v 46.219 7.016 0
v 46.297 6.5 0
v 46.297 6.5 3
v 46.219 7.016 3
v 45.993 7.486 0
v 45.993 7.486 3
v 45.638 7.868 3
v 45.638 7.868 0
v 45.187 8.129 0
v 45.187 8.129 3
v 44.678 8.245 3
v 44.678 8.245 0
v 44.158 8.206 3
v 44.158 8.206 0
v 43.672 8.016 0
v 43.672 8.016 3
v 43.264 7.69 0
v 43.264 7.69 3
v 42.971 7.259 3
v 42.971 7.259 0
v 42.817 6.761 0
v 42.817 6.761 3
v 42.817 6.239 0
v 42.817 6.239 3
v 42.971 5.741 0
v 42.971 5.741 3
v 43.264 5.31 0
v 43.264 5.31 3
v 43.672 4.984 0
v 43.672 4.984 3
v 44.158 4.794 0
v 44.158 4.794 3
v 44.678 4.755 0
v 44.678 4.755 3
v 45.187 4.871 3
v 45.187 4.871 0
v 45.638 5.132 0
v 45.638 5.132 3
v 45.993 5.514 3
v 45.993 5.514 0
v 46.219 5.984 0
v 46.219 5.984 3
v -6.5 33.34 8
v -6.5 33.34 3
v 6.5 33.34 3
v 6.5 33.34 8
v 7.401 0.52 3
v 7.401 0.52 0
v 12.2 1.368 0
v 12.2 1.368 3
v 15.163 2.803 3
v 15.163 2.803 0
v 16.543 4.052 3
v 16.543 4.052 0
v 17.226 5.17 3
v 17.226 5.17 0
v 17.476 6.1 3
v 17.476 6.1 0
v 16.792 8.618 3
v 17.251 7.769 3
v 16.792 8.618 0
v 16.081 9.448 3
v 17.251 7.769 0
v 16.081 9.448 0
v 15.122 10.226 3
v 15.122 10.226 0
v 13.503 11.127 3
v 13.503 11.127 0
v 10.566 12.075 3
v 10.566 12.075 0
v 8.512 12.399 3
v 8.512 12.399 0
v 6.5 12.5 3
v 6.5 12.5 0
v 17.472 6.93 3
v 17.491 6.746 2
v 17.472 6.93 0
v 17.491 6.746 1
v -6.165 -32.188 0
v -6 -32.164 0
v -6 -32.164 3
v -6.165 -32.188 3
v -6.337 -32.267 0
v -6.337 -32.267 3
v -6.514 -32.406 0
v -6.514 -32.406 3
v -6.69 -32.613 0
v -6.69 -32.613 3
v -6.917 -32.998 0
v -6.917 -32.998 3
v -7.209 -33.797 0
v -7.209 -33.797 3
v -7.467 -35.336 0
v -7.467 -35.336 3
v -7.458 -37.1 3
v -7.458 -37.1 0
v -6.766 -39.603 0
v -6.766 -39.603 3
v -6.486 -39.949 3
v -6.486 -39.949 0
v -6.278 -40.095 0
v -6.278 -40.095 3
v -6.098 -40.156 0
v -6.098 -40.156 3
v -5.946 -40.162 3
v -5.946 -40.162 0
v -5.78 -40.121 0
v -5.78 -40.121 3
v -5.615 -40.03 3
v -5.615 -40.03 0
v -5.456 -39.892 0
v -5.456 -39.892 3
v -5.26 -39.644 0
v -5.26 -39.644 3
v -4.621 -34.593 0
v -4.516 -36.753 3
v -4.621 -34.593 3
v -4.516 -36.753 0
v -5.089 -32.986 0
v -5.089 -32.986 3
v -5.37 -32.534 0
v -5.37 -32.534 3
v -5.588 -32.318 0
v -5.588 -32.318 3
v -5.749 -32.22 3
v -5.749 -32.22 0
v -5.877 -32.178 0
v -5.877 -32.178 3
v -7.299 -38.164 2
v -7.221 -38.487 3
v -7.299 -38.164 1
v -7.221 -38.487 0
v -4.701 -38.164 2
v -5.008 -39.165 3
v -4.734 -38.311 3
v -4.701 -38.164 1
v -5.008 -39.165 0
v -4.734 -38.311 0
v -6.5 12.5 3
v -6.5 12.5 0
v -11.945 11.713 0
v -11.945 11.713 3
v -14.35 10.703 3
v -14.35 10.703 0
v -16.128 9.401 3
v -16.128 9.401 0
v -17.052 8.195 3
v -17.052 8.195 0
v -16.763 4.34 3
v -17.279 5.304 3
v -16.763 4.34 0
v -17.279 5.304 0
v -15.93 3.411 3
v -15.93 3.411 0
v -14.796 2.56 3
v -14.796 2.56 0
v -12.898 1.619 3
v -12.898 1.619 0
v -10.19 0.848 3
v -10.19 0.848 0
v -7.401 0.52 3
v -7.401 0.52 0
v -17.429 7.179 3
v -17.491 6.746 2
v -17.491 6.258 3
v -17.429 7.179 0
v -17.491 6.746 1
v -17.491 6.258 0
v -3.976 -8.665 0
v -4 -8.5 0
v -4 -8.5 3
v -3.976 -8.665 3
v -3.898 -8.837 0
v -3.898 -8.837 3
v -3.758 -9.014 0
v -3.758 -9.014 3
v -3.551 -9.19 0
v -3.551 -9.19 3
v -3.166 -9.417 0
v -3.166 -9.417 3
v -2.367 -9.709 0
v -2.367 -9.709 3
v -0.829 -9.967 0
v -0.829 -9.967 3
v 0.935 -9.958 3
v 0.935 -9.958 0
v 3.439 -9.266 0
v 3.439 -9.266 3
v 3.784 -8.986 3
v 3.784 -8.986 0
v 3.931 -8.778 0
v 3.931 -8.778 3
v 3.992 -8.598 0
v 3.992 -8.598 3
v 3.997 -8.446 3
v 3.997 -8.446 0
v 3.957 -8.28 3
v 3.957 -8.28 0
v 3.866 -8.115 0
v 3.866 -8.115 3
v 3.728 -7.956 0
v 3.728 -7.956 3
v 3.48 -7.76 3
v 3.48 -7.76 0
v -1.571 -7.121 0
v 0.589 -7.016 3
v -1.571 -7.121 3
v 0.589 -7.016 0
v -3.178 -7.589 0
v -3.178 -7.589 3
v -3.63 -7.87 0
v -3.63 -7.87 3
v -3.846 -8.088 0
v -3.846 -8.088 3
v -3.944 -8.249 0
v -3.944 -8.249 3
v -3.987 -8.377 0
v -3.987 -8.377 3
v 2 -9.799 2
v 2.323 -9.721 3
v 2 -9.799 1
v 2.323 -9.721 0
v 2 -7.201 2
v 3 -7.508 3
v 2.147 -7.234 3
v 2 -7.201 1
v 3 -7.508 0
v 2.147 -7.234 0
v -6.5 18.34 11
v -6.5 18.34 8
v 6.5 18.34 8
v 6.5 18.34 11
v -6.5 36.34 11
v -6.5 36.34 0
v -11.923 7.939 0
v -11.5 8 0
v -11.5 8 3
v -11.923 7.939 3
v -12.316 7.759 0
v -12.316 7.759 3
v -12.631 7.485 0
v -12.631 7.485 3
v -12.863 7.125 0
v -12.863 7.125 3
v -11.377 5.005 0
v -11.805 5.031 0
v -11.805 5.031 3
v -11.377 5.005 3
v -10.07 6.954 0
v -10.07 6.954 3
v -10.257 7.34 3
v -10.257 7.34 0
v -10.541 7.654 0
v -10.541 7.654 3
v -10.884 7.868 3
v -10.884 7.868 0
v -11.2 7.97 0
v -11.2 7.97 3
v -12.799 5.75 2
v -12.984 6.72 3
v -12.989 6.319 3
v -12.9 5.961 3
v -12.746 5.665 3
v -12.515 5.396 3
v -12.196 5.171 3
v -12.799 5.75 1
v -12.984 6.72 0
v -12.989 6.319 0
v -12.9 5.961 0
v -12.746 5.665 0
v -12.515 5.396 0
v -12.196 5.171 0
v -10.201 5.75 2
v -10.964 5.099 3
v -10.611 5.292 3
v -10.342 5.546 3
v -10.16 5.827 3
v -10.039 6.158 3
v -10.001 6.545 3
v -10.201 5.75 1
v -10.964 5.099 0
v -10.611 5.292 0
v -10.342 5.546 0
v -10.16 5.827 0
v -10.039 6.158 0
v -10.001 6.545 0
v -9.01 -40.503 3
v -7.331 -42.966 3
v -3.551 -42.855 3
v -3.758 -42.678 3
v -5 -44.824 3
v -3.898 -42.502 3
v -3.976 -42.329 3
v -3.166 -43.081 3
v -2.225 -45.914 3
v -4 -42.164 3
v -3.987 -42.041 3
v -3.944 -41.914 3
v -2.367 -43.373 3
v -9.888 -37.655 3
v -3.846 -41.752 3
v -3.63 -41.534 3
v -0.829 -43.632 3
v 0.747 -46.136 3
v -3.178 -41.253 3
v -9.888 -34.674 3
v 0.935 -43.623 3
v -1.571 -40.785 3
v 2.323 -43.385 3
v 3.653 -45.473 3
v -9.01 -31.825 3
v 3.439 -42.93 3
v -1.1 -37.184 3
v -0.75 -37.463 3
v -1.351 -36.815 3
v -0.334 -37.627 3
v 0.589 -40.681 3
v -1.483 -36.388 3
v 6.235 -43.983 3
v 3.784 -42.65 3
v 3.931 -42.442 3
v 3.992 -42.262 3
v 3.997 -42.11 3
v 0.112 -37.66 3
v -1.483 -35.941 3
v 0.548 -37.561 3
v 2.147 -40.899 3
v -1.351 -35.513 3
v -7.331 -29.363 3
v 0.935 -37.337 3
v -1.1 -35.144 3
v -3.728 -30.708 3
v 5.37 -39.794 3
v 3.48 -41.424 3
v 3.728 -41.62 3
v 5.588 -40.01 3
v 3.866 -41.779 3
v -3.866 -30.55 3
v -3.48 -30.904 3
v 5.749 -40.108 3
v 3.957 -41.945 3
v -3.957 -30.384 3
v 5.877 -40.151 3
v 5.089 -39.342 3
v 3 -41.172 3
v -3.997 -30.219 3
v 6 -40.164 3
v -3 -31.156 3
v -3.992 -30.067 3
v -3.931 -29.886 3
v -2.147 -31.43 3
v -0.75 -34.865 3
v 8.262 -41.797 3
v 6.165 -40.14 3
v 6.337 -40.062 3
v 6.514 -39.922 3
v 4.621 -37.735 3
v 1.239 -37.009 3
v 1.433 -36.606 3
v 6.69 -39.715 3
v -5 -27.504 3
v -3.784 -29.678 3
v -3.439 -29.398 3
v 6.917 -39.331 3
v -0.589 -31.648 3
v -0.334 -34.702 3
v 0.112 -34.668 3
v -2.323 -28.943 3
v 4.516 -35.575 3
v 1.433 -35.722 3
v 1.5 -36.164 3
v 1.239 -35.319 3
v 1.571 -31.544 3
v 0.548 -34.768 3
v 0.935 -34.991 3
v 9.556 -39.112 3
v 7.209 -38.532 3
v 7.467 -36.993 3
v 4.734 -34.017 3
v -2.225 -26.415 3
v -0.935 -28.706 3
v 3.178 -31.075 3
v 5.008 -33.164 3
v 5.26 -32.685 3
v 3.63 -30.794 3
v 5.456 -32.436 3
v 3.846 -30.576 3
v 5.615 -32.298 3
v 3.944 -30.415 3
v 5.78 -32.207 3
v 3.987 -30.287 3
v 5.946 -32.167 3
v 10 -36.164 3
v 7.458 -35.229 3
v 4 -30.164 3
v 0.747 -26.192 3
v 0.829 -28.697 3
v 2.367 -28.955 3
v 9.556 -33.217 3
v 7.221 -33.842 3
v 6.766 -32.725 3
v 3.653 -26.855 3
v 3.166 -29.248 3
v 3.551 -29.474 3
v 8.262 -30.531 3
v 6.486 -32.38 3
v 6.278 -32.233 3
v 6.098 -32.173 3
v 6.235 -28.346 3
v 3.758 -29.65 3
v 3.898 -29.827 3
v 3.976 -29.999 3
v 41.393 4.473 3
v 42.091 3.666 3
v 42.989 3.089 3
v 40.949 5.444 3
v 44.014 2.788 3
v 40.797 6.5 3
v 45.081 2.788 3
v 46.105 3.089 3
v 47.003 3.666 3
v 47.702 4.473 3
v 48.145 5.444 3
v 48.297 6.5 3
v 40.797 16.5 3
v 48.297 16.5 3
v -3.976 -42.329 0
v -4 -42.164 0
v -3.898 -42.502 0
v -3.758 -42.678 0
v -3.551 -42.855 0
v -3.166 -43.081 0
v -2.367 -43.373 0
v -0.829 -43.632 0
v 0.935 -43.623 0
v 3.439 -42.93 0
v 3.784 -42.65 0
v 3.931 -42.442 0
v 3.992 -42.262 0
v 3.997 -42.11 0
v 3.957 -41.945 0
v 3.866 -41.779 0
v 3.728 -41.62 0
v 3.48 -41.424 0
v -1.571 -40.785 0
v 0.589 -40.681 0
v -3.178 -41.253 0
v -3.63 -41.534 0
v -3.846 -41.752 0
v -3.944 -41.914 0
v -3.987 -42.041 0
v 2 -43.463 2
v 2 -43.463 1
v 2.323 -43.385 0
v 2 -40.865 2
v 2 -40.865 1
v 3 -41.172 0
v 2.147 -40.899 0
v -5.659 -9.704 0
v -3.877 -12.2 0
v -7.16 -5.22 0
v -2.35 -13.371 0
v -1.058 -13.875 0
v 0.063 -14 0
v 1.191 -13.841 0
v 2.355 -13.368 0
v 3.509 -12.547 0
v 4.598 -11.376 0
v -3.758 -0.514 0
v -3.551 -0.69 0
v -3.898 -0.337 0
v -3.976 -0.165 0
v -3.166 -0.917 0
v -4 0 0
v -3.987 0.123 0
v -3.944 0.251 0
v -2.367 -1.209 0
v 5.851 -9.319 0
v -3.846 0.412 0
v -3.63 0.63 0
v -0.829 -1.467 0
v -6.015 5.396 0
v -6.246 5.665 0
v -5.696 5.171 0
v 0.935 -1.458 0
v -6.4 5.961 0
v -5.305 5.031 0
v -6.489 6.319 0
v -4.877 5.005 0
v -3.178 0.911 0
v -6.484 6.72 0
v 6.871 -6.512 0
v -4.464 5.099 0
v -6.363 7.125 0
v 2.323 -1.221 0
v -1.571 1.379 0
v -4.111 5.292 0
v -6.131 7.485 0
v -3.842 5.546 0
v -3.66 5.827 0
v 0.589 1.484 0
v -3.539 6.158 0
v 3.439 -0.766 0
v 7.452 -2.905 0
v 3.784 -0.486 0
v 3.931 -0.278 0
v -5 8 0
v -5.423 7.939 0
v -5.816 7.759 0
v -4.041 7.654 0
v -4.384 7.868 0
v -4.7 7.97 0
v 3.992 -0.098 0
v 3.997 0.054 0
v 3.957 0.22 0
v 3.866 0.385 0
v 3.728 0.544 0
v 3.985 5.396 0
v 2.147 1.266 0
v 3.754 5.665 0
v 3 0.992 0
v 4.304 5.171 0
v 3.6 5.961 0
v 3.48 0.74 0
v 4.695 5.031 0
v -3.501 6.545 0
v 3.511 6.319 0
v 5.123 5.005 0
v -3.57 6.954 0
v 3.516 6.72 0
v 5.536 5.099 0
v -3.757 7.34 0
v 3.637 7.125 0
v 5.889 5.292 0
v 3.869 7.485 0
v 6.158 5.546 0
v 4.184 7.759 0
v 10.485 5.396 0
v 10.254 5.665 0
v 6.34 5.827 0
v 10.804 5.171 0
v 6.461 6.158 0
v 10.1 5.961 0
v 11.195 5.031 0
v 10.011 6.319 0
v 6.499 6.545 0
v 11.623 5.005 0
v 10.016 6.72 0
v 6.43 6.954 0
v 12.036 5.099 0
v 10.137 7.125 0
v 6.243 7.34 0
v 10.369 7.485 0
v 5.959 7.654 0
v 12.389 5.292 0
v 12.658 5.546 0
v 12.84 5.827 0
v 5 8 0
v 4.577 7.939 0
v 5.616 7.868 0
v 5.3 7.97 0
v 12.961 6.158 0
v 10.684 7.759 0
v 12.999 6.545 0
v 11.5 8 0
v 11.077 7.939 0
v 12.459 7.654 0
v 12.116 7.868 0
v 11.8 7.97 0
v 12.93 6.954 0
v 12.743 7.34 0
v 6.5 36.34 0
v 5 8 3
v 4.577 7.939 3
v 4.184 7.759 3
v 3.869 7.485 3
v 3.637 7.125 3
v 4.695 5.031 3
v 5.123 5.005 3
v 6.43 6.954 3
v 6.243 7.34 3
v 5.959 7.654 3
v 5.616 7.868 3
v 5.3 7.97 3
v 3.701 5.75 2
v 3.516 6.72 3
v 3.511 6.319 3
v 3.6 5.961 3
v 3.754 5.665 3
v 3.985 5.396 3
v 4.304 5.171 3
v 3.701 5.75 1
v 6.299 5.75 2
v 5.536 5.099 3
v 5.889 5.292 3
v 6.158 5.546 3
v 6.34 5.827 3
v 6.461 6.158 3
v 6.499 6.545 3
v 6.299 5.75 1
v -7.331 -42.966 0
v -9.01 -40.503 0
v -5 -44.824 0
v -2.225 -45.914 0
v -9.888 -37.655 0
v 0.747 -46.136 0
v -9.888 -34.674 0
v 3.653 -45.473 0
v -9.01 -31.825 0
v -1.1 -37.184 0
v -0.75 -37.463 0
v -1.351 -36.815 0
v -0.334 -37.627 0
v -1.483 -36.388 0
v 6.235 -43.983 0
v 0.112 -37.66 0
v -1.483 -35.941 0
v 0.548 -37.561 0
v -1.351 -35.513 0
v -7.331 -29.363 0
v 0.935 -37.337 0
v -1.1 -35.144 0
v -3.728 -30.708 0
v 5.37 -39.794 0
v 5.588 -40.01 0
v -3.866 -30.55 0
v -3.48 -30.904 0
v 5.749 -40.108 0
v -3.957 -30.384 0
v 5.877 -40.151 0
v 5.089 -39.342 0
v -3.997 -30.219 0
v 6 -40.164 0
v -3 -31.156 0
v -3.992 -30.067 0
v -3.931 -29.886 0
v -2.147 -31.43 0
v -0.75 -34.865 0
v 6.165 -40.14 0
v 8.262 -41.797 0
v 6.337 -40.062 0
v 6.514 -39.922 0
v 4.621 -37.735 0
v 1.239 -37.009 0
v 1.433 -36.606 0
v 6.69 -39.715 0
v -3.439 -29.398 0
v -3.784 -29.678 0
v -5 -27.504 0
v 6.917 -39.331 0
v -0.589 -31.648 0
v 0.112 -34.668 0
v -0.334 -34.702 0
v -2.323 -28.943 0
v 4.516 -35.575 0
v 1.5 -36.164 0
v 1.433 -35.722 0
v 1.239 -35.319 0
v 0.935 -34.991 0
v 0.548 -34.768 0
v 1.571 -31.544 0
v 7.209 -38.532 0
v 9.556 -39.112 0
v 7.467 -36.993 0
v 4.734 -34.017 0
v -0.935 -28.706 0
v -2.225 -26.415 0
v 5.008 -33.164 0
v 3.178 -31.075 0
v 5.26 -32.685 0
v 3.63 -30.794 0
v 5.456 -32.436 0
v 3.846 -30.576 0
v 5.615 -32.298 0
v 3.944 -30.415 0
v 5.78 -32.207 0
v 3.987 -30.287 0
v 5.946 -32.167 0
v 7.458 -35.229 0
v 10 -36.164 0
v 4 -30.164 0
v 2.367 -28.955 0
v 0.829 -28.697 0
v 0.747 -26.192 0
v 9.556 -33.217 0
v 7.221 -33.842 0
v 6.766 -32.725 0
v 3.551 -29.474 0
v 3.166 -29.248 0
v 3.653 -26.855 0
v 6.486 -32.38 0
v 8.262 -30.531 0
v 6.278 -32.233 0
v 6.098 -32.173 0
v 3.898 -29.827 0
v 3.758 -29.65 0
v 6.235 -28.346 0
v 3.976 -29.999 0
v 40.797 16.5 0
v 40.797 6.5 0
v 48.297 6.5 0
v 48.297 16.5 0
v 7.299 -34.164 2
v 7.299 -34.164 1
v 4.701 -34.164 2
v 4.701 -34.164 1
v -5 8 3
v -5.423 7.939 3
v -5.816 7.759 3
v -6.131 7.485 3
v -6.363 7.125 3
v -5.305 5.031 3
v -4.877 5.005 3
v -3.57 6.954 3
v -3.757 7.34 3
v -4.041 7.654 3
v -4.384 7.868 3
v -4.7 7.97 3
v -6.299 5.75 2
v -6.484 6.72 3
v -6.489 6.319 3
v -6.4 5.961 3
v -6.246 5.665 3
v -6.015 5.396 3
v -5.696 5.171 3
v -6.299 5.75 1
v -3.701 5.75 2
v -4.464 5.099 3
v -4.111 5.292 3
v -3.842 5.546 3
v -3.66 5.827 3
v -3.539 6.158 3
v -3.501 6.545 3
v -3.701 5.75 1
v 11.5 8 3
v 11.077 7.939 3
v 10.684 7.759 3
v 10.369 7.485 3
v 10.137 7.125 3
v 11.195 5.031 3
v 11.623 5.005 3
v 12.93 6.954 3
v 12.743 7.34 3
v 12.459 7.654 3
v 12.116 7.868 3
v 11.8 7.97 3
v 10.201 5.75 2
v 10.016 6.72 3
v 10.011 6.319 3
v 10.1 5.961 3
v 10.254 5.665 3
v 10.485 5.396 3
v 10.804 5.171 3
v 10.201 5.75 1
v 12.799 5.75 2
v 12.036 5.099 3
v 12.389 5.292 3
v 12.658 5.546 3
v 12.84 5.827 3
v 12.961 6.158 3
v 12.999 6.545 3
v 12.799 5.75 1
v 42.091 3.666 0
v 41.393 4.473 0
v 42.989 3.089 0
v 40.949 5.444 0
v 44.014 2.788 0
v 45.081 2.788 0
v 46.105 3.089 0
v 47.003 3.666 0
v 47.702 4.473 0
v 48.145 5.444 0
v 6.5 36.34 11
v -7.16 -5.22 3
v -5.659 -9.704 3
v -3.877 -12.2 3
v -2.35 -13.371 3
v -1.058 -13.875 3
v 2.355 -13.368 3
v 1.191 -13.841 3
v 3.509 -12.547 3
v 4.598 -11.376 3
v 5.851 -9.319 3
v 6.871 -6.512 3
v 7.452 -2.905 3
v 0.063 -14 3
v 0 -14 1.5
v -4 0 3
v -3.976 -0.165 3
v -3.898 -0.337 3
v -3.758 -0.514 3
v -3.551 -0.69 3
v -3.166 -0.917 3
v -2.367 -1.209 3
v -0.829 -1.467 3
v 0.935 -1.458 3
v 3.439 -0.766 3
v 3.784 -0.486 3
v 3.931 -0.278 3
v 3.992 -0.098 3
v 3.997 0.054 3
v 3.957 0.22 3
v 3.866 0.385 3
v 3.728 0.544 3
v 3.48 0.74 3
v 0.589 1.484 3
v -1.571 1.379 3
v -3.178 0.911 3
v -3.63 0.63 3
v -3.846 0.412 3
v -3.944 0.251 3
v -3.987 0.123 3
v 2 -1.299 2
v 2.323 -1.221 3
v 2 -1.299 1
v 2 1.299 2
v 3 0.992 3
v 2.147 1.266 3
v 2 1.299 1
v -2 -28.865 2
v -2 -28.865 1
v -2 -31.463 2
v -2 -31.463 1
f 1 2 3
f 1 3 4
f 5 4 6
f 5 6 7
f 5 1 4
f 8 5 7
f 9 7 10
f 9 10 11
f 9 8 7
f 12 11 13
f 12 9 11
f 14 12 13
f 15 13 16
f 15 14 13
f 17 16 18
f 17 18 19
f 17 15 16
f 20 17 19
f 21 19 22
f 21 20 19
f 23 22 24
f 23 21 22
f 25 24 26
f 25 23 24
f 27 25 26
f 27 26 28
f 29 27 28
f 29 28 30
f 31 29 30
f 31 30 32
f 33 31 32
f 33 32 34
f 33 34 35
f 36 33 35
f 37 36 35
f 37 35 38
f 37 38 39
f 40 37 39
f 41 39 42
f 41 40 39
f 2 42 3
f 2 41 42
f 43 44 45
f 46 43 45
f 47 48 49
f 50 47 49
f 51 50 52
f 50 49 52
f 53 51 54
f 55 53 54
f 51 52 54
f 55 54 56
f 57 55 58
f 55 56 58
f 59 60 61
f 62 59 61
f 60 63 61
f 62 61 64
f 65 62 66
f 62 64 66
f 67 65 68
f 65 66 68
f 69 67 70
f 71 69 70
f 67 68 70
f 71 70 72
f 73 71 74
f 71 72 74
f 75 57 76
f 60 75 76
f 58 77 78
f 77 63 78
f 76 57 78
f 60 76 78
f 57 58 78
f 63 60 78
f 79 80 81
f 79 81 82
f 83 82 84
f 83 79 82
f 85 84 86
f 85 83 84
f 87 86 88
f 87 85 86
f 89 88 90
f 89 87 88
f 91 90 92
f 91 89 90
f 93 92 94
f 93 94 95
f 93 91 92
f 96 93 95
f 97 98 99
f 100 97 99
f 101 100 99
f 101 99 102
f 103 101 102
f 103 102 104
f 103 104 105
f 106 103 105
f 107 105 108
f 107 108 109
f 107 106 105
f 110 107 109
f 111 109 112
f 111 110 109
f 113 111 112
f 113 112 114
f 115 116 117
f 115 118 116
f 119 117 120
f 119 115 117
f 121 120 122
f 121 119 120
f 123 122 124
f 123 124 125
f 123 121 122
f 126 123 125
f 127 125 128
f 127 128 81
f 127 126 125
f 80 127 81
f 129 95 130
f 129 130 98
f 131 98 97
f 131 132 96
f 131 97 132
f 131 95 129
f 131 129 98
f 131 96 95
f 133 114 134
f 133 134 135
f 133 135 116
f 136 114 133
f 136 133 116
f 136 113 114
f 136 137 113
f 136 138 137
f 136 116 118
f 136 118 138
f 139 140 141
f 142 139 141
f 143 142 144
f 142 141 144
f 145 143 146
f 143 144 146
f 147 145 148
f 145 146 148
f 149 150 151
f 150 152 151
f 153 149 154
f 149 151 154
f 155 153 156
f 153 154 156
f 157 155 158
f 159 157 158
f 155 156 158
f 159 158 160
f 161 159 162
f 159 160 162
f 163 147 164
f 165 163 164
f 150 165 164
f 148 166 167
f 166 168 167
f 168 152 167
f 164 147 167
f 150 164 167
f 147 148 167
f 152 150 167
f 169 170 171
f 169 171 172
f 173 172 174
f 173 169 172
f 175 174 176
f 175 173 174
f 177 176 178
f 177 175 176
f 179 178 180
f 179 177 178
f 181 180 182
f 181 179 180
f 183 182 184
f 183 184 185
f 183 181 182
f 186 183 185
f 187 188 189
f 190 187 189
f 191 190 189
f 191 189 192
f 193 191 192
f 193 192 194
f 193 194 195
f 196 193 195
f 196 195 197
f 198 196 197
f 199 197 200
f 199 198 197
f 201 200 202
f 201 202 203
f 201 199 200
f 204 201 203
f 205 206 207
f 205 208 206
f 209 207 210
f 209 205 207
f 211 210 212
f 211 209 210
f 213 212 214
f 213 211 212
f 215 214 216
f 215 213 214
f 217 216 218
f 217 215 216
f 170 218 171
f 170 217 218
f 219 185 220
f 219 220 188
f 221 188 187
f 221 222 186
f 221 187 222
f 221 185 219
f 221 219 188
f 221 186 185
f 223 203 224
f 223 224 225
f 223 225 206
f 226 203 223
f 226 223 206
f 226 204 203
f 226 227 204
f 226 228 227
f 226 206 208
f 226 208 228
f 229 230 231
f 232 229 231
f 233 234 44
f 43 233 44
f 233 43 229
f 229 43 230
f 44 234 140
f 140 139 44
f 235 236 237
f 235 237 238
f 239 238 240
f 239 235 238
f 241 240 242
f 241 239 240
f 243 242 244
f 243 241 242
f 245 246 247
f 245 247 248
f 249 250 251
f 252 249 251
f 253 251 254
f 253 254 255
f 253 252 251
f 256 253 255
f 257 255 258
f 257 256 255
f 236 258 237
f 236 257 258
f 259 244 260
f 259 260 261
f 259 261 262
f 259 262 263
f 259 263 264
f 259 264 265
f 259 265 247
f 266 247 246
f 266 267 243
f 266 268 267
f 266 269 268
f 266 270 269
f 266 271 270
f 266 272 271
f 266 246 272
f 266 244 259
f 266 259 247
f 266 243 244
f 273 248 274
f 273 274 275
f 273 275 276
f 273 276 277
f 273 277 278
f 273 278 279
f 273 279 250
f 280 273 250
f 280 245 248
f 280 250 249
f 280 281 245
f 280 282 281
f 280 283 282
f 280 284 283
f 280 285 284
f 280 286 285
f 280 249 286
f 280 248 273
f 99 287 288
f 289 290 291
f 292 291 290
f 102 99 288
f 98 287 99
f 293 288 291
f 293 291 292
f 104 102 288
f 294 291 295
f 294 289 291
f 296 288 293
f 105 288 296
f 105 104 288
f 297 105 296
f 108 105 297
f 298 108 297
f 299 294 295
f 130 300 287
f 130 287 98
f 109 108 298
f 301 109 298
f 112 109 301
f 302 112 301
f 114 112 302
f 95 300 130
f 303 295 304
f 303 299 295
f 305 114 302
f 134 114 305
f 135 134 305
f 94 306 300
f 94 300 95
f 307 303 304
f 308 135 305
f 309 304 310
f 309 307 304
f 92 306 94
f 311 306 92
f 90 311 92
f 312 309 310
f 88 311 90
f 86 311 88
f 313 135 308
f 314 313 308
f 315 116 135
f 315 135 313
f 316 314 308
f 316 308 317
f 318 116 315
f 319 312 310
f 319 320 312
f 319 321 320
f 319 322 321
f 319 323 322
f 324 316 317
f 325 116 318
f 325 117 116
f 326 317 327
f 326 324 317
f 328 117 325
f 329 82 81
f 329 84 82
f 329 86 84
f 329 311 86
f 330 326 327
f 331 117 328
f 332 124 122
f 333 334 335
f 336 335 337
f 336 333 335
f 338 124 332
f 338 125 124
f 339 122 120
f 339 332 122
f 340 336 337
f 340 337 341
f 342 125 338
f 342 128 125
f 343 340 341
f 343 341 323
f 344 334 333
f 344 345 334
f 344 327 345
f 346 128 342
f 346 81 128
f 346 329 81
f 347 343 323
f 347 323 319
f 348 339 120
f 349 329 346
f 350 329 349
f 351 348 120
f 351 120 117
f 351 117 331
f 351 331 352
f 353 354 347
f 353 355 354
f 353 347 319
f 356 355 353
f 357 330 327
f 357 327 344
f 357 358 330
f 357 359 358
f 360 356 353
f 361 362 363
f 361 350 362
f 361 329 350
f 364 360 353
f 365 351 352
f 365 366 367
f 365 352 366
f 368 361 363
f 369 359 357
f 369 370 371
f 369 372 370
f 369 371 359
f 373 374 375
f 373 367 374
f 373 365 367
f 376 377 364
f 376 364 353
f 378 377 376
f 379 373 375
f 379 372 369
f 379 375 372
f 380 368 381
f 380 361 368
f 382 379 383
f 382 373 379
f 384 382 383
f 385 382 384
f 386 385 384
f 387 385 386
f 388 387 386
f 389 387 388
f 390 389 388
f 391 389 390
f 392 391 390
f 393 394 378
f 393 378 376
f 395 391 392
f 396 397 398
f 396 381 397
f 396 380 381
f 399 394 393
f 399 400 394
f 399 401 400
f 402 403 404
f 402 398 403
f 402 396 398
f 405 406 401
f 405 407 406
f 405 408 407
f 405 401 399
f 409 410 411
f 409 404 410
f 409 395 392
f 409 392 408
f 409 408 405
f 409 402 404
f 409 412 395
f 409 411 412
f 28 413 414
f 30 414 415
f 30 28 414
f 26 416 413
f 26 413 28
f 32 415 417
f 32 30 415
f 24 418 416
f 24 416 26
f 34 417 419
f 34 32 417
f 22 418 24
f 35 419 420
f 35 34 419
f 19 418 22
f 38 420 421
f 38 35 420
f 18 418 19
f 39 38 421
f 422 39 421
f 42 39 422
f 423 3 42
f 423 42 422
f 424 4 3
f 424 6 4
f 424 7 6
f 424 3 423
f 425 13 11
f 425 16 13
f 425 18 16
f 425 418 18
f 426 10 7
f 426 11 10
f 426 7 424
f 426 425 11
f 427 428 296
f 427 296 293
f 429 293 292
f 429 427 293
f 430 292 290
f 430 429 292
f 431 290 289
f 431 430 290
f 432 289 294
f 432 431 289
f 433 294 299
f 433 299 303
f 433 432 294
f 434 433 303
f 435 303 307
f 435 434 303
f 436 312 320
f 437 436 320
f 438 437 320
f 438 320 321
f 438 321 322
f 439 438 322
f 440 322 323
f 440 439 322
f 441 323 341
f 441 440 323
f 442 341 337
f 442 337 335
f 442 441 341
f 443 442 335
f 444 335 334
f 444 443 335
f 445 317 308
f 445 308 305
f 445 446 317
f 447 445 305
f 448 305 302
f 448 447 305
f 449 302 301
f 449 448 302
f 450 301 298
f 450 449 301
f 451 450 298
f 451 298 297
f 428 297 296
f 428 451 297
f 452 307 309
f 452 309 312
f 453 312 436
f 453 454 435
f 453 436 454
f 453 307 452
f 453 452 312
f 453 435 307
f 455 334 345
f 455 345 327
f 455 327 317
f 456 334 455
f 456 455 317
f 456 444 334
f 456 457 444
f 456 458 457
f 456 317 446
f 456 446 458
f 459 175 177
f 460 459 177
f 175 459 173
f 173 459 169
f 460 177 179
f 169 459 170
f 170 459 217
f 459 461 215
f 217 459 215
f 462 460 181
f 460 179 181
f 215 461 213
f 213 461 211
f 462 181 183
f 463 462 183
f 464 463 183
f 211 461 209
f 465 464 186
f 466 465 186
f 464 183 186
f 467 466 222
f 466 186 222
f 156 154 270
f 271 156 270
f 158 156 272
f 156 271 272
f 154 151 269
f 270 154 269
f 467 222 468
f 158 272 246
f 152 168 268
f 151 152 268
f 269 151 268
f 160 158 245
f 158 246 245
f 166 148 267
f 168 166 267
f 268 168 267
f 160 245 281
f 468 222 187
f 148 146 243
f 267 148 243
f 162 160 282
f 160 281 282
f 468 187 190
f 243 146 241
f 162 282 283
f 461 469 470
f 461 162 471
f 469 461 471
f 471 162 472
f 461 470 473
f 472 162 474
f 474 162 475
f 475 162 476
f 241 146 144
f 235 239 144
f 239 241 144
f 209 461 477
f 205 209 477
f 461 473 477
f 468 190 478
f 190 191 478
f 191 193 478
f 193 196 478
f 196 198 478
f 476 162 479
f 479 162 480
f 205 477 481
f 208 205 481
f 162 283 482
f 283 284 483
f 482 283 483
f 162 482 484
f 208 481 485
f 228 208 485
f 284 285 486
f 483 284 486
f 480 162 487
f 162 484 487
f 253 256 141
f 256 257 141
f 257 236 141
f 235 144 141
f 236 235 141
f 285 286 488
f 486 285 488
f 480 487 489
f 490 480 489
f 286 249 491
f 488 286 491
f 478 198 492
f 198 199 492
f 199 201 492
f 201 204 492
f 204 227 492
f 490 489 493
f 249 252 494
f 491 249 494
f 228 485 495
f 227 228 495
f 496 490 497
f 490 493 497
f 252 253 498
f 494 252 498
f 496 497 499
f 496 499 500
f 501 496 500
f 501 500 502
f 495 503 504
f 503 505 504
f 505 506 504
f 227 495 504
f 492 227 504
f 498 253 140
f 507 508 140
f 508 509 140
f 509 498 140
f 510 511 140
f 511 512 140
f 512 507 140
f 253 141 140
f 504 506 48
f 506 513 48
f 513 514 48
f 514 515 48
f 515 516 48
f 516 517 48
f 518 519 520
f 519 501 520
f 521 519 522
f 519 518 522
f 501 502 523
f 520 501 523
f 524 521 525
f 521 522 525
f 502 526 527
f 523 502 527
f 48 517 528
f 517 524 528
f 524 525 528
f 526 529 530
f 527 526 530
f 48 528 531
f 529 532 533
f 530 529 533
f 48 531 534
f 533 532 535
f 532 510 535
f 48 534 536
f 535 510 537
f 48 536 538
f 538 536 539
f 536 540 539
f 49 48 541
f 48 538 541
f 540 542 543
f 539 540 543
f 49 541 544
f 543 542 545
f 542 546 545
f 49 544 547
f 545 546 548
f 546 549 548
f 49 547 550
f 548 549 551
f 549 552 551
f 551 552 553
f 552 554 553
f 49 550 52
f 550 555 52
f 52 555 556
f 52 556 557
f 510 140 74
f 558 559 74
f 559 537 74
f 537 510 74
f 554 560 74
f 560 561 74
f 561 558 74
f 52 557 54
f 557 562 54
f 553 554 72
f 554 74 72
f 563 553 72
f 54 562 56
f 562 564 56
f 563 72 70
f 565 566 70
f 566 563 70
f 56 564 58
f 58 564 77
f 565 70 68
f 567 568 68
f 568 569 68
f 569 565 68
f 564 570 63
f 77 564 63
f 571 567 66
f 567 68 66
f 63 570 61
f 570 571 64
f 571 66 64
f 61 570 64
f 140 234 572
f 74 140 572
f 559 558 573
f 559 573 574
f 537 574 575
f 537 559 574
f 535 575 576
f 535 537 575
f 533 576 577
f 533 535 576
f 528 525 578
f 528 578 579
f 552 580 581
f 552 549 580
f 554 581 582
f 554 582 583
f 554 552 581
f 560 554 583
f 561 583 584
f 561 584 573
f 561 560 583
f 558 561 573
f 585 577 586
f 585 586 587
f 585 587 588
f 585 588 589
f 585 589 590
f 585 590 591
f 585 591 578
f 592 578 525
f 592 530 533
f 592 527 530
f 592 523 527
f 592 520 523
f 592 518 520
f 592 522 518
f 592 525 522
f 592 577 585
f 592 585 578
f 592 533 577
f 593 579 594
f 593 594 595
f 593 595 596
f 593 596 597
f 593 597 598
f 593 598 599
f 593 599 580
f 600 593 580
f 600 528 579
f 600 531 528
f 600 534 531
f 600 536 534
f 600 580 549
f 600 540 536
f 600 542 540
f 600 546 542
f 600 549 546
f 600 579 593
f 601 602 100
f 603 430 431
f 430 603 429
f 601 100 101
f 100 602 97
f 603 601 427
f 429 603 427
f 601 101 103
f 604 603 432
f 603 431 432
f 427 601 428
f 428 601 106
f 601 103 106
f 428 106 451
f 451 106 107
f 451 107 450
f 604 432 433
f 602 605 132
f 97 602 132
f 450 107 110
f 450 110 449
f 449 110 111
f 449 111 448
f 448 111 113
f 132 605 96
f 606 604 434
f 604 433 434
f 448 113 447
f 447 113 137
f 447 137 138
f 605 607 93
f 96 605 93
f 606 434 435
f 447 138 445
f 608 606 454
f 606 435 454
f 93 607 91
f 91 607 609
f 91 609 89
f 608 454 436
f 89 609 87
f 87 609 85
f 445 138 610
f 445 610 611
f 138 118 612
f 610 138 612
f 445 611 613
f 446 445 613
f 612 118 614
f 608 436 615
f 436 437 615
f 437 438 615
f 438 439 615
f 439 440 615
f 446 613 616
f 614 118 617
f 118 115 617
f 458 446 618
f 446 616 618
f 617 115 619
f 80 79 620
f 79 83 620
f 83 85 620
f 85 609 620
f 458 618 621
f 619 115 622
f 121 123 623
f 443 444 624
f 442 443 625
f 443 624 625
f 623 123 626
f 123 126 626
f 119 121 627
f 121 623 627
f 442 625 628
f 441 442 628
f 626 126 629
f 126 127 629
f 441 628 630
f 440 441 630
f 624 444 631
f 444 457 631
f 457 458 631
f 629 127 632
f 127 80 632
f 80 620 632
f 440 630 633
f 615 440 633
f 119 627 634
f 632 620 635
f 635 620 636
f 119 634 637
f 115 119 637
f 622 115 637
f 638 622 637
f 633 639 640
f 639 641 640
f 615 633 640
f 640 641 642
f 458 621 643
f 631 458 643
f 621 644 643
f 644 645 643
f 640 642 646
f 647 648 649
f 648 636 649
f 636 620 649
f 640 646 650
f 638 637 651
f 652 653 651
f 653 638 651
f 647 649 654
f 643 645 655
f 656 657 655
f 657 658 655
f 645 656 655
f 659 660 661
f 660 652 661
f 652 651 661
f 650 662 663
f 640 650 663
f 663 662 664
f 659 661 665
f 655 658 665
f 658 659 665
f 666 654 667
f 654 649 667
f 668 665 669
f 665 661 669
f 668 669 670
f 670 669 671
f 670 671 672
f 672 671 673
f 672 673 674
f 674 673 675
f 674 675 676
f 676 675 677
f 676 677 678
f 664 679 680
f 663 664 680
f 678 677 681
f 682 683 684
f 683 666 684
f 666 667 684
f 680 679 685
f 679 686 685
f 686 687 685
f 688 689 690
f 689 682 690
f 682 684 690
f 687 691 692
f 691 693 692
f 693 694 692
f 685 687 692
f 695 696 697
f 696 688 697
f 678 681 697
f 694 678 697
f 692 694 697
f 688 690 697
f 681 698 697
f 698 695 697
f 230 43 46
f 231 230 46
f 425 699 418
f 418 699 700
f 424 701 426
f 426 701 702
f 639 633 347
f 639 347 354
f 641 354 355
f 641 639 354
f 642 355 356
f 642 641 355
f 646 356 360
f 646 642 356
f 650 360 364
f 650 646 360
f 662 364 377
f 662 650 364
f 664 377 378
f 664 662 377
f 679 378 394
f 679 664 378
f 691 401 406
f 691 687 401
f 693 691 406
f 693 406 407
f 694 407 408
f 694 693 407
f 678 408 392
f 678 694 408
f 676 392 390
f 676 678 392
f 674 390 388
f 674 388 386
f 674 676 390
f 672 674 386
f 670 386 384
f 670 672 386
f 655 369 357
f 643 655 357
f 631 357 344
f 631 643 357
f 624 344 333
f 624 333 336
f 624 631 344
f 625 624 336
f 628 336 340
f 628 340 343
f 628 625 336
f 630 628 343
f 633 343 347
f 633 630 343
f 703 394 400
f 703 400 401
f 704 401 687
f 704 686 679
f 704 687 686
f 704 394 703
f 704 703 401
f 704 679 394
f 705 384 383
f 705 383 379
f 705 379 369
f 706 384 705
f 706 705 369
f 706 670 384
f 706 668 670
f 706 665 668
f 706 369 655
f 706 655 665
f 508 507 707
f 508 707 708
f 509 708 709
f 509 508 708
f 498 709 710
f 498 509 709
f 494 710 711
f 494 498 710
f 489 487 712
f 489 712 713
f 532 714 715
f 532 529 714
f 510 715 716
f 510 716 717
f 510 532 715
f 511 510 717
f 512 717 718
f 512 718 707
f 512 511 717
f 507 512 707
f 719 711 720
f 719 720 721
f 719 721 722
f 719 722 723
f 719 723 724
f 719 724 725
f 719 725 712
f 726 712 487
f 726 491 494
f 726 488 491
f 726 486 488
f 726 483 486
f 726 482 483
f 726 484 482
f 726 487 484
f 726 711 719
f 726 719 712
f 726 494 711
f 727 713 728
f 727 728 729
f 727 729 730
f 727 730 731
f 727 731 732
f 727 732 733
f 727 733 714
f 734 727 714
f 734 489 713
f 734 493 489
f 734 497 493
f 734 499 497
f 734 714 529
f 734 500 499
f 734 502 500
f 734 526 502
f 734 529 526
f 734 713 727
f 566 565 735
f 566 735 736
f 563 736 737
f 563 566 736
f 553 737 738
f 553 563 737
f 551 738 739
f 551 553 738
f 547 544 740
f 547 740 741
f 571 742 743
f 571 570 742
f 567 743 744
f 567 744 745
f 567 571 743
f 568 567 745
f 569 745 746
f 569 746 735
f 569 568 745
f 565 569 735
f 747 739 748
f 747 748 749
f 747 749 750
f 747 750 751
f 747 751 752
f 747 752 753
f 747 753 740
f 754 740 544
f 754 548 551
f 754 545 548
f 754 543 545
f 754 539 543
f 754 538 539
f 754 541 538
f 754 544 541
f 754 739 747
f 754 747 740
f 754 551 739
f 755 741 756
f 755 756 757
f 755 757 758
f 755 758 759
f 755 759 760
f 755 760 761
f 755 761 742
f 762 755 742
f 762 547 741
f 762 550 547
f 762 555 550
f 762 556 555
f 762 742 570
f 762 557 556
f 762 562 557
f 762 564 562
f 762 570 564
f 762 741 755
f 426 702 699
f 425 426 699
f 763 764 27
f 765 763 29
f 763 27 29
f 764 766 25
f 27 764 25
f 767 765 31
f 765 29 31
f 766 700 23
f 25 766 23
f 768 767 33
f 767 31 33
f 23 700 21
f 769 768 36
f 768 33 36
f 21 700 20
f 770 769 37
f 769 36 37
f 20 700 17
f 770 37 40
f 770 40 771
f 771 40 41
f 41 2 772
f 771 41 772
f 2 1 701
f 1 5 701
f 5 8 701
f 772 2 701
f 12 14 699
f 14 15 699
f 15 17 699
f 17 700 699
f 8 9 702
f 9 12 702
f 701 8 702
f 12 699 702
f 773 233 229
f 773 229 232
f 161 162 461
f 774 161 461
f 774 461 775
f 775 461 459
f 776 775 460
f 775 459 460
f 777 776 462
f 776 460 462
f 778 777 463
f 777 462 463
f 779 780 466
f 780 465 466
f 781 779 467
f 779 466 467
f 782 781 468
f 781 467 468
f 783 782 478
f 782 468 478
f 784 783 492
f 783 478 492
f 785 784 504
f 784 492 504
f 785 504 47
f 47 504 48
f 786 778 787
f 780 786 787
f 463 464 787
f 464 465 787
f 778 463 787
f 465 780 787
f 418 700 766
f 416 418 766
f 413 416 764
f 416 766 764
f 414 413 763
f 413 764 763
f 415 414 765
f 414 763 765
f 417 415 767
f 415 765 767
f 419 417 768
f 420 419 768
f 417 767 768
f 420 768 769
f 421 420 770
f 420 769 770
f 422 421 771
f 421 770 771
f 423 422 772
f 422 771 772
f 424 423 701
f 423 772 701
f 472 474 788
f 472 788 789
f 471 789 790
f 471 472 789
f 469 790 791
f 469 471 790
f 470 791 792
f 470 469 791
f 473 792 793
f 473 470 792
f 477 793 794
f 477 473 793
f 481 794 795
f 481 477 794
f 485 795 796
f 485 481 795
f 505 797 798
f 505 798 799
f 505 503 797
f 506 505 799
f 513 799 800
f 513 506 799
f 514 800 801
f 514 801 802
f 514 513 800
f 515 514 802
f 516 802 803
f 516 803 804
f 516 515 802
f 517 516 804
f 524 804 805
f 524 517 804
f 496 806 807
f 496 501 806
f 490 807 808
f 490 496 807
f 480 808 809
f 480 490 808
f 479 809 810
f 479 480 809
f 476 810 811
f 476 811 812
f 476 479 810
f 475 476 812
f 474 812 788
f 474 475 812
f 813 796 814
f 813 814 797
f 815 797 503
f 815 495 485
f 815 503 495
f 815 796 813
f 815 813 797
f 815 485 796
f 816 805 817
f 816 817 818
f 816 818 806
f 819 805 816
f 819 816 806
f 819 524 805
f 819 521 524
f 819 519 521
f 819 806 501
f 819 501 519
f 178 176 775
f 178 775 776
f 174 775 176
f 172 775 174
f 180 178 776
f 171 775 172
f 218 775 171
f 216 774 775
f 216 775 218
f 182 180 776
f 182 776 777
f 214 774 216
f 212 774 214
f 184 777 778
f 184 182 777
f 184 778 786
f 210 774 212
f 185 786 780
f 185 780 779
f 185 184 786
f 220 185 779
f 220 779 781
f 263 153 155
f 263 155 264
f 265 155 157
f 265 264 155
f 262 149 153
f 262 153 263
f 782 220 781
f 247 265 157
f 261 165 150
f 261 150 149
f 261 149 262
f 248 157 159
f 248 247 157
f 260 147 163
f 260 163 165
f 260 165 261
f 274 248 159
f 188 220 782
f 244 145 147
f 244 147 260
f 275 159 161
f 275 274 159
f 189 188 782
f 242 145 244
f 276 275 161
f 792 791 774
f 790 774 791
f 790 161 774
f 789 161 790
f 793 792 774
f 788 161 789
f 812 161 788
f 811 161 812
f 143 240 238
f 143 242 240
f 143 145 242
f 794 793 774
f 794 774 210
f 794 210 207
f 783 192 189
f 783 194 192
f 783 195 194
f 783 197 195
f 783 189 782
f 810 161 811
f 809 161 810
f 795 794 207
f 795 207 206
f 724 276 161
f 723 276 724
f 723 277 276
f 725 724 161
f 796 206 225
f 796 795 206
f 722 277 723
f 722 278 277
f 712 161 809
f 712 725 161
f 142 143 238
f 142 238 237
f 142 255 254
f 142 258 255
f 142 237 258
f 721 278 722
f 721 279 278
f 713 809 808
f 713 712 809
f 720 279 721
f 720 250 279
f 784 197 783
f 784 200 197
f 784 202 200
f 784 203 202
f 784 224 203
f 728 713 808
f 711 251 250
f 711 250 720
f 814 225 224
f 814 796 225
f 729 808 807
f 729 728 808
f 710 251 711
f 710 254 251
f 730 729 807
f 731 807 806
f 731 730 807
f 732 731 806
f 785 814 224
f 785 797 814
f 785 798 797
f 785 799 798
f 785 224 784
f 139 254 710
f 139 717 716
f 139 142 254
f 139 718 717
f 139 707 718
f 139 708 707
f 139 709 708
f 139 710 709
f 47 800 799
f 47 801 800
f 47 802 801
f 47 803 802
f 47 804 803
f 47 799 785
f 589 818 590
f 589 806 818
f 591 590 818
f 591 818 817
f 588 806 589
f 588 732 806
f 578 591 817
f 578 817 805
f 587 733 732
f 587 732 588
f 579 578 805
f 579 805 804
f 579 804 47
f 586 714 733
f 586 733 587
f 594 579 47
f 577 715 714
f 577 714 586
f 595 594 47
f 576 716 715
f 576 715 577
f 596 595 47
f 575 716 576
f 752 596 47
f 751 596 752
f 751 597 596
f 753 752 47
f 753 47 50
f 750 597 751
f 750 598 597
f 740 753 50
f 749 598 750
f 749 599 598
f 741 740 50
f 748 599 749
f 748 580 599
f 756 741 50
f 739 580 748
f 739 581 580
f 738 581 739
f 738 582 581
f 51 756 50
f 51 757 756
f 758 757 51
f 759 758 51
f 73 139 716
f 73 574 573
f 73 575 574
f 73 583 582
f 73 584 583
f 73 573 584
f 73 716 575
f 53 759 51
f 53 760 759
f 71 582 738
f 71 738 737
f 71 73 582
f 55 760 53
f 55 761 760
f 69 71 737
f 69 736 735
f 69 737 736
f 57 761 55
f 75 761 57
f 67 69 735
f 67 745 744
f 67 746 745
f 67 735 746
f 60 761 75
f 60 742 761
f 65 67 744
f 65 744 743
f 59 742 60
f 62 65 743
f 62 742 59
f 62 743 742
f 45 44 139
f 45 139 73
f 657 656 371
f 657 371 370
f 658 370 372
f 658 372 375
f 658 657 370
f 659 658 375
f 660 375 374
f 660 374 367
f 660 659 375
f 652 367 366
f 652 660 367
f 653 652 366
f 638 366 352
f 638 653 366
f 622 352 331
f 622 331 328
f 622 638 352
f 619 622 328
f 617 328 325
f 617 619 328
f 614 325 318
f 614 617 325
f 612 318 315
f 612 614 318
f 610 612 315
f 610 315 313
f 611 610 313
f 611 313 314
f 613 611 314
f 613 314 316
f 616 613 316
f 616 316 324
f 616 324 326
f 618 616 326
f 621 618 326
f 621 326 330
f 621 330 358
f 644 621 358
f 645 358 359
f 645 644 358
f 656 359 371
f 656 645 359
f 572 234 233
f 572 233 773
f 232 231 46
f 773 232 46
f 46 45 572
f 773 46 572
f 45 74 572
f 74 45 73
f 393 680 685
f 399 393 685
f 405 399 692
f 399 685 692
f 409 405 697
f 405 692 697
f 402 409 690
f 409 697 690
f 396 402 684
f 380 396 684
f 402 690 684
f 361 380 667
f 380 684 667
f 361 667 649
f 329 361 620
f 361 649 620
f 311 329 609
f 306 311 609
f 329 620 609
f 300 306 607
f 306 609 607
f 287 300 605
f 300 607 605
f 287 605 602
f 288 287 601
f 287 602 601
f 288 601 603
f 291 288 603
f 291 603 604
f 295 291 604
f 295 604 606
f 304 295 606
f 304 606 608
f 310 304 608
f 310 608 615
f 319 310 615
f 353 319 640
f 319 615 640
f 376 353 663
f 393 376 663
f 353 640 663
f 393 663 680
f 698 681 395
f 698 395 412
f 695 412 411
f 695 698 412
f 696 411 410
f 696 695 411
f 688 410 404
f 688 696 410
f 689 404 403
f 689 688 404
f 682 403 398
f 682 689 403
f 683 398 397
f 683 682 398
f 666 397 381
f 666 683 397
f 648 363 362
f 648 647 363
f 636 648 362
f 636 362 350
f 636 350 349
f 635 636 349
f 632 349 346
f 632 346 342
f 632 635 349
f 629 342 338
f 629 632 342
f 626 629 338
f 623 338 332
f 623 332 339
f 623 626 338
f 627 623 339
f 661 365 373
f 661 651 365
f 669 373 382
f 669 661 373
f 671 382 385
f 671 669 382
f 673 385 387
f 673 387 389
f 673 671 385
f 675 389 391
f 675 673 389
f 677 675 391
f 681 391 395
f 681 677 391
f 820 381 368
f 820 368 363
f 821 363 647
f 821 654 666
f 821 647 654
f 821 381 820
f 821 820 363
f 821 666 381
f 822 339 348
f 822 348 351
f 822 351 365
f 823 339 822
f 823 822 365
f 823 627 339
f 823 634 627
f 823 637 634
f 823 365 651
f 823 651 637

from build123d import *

# Parameters (mm, degrees)
F0_W     = 13
F0_H     = 15
F0_H_2   = 3
F1_DEPTH = 3
F2_DEPTH = 11
F3_START = 8
F3_DEPTH = 3
F0_R     = 10
F0_R_2   = 1.5
F4_DEPTH = 3
F0_R_3   = 1.75
F5_DEPTH = 3


with BuildPart() as f1:
    # F0 (on Top) → F1 (new body)
    with BuildSketch(Plane.XY):
        with BuildLine():
            add(Edge.make_bspline(
                [(6.5, 12.5), (2.9023563725, 12.5), (0, 11.3404289134)],
                knots=[1.5707963268, 1.5707963268, 1.5707963268, 2.2029815755, 2.2029815755, 2.2029815755], degree=2, weights=[1, 0.9504572984, 1]))
            add(Edge.make_bspline(
                [(0, 11.3404289134), (-2.9023563725, 12.5), (-6.5, 12.5)],
                knots=[0.9386110781, 0.9386110781, 0.9386110781, 1.5707963268, 1.5707963268, 1.5707963268], degree=2, weights=[1, 0.9504572984, 1]))
            add(Edge.make_bspline(
                [(-6.5, 12.5), (-17.0577988838, 12.5), (-17.4907472501, 6.7460446753), (-17.9236956164, 0.9920893505), (-7.401404946, 0.5201793274)],
                knots=[1.5707963268, 1.5707963268, 1.5707963268, 3.1005737059, 3.1005737059, 4.630351085, 4.630351085, 4.630351085], degree=2, weights=[1, 0.7214594396, 1, 0.7214594396, 1]))
            add(Edge.make_bspline(
                [(-7.401404946, 0.5201793274), (-8.8281626867, -14), (0, -14), (8.8281626867, -14), (7.401404946, 0.5201793274)],
                knots=[4.5500626947, 4.5500626947, 4.5500626947, 6.2831853072, 6.2831853072, 8.0163079197, 8.0163079197, 8.0163079197], degree=2, weights=[1, 0.6474510228, 1, 0.6474510228, 1]))
            add(Edge.make_bspline(
                [(7.401404946, 0.5201793274), (17.9236956164, 0.9920893505), (17.4907472501, 6.7460446753), (17.0577988838, 12.5), (6.5, 12.5)],
                knots=[4.7944268757, 4.7944268757, 4.7944268757, 6.3242042549, 6.3242042549, 7.853981634, 7.853981634, 7.853981634], degree=2, weights=[1, 0.7214594396, 1, 0.7214594396, 1]))
        make_face()
        with BuildLine():
            add(Edge.make_bspline(
                [(-4, -8.5), (-4, -11.0980762114), (2, -9.7990381057), (8, -8.5), (2, -7.2009618943), (-4, -5.9019237886), (-4, -8.5)],
                knots=[0, 0, 0, 2.0943951024, 2.0943951024, 4.1887902048, 4.1887902048, 6.2831853072, 6.2831853072, 6.2831853072], degree=2, weights=[1, 0.5, 1, 0.5, 1, 0.5, 1]))
        make_face(mode=Mode.SUBTRACT)
        with BuildLine():
            add(Edge.make_bspline(
                [(-11.5, 8), (-14.0980762114, 8), (-12.7990381057, 5.75), (-11.5, 3.5), (-10.2009618943, 5.75), (-8.9019237886, 8), (-11.5, 8)],
                knots=[0, 0, 0, 2.0943951024, 2.0943951024, 4.1887902048, 4.1887902048, 6.2831853072, 6.2831853072, 6.2831853072], degree=2, weights=[1, 0.5, 1, 0.5, 1, 0.5, 1]))
        make_face(mode=Mode.SUBTRACT)
        with BuildLine():
            add(Edge.make_bspline(
                [(-5, 8), (-7.5980762114, 8), (-6.2990381057, 5.75), (-5, 3.5), (-3.7009618943, 5.75), (-2.4019237886, 8), (-5, 8)],
                knots=[0, 0, 0, 2.0943951024, 2.0943951024, 4.1887902048, 4.1887902048, 6.2831853072, 6.2831853072, 6.2831853072], degree=2, weights=[1, 0.5, 1, 0.5, 1, 0.5, 1]))
        make_face(mode=Mode.SUBTRACT)
        with BuildLine():
            add(Edge.make_bspline(
                [(-4, 0), (-4, -2.5980762114), (2, -1.2990381057), (8, 0), (2, 1.2990381057), (-4, 2.5980762114), (-4, 0)],
                knots=[0, 0, 0, 2.0943951024, 2.0943951024, 4.1887902048, 4.1887902048, 6.2831853072, 6.2831853072, 6.2831853072], degree=2, weights=[1, 0.5, 1, 0.5, 1, 0.5, 1]))
        make_face(mode=Mode.SUBTRACT)
        with BuildLine():
            add(Edge.make_bspline(
                [(5, 8), (2.4019237886, 8), (3.7009618943, 5.75), (5, 3.5), (6.2990381057, 5.75), (7.5980762114, 8), (5, 8)],
                knots=[0, 0, 0, 2.0943951024, 2.0943951024, 4.1887902048, 4.1887902048, 6.2831853072, 6.2831853072, 6.2831853072], degree=2, weights=[1, 0.5, 1, 0.5, 1, 0.5, 1]))
        make_face(mode=Mode.SUBTRACT)
        with BuildLine():
            add(Edge.make_bspline(
                [(11.5, 8), (8.9019237886, 8), (10.2009618943, 5.75), (11.5, 3.5), (12.7990381057, 5.75), (14.0980762114, 8), (11.5, 8)],
                knots=[0, 0, 0, 2.0943951024, 2.0943951024, 4.1887902048, 4.1887902048, 6.2831853072, 6.2831853072, 6.2831853072], degree=2, weights=[1, 0.5, 1, 0.5, 1, 0.5, 1]))
        make_face(mode=Mode.SUBTRACT)
        with BuildLine():
            add(Edge.make_bspline(
                [(0, 11.3404289134), (-2.9023563725, 12.5), (-6.5, 12.5)],
                knots=[0.9386110781, 0.9386110781, 0.9386110781, 1.5707963268, 1.5707963268, 1.5707963268], degree=2, weights=[1, 0.9504572984, 1]))
            add(Edge.make_bspline(
                [(6.5, 12.5), (2.9023563725, 12.5), (0, 11.3404289134)],
                knots=[1.5707963268, 1.5707963268, 1.5707963268, 2.2029815755, 2.2029815755, 2.2029815755], degree=2, weights=[1, 0.9504572984, 1]))
            Line((6.5, 12.5), (6.5, 18.3404289134))
            Line((6.5, 18.3404289134), (-6.5, 18.3404289134))
            Line((-6.5, 18.3404289134), (-6.5, 12.5))
        make_face()
        with Locations((0, 25.8404289134)):
            Rectangle(F0_W, F0_H)
        with Locations((0, 34.8404289134)):
            Rectangle(F0_W, F0_H_2)
    extrude(amount=F1_DEPTH)

    # F0 (on Top) → F2 (join)
    with BuildSketch(Plane.XY):
        with Locations((0, 34.8404289134)):
            Rectangle(F0_W, F0_H_2)
    extrude(amount=F2_DEPTH)

    # F0 (on Top) → F3 (join)
    with BuildSketch(Plane.XY.offset(F3_START)):
        with Locations((0, 34.8404289134)):
            Rectangle(F0_W, F0_H_2)
        with Locations((0, 25.8404289134)):
            Rectangle(F0_W, F0_H)
    extrude(amount=F3_DEPTH)


with BuildPart() as f4:
    # F0 (on Top) → F4 (new body)
    with BuildSketch(Plane.XY):
        with Locations((0, -36.1642315984)):
            Circle(F0_R)
        with BuildLine():
            add(Edge.make_bspline(
                [(-6, -32.1642315984), (-8.5980762114, -32.1642315984), (-7.2990381057, -38.1642315984), (-6, -44.1642315984), (-4.7009618943, -38.1642315984), (-3.4019237886, -32.1642315984), (-6, -32.1642315984)],
                knots=[0, 0, 0, 2.0943951024, 2.0943951024, 4.1887902048, 4.1887902048, 6.2831853072, 6.2831853072, 6.2831853072], degree=2, weights=[1, 0.5, 1, 0.5, 1, 0.5, 1]))
        make_face(mode=Mode.SUBTRACT)
        with BuildLine():
            add(Edge.make_bspline(
                [(-4, -42.1642315984), (-4, -44.7623078097), (2, -43.4632697041), (8, -42.1642315984), (2, -40.8651934927), (-4, -39.566155387), (-4, -42.1642315984)],
                knots=[0, 0, 0, 2.0943951024, 2.0943951024, 4.1887902048, 4.1887902048, 6.2831853072, 6.2831853072, 6.2831853072], degree=2, weights=[1, 0.5, 1, 0.5, 1, 0.5, 1]))
        make_face(mode=Mode.SUBTRACT)
        with Locations((0, -36.1642315984)):
            Circle(F0_R_2, mode=Mode.SUBTRACT)
        with BuildLine():
            add(Edge.make_bspline(
                [(6, -40.1642315984), (8.5980762114, -40.1642315984), (7.2990381057, -34.1642315984), (6, -28.1642315984), (4.7009618943, -34.1642315984), (3.4019237886, -40.1642315984), (6, -40.1642315984)],
                knots=[0, 0, 0, 2.0943951024, 2.0943951024, 4.1887902048, 4.1887902048, 6.2831853072, 6.2831853072, 6.2831853072], degree=2, weights=[1, 0.5, 1, 0.5, 1, 0.5, 1]))
        make_face(mode=Mode.SUBTRACT)
        with BuildLine():
            add(Edge.make_bspline(
                [(4, -30.1642315984), (4, -27.566155387), (-2, -28.8651934927), (-8, -30.1642315984), (-2, -31.4632697041), (4, -32.7623078097), (4, -30.1642315984)],
                knots=[0, 0, 0, 2.0943951024, 2.0943951024, 4.1887902048, 4.1887902048, 6.2831853072, 6.2831853072, 6.2831853072], degree=2, weights=[1, 0.5, 1, 0.5, 1, 0.5, 1]))
        make_face(mode=Mode.SUBTRACT)
    extrude(amount=F4_DEPTH)


with BuildPart() as f5:
    # F0 (on Top) → F5 (new body)
    with BuildSketch(Plane.XY):
        with BuildLine():
            ThreePointArc((40.7972039282, 6.5), (44.5472039282, 10.25), (48.2972039282, 6.5))
            Line((48.2972039282, 6.5), (48.2972039282, 16.5))
            Line((48.2972039282, 16.5), (40.7972039282, 16.5))
            Line((40.7972039282, 16.5), (40.7972039282, 6.5))
        make_face()
        with BuildLine():
            ThreePointArc((40.7972039282, 6.5), (44.5472039282, 2.75), (48.2972039282, 6.5))
            ThreePointArc((48.2972039282, 6.5), (44.5472039282, 10.25), (40.7972039282, 6.5))
        make_face()
        with Locations((44.5472039282, 6.5)):
            Circle(F0_R_3, mode=Mode.SUBTRACT)
    extrude(amount=F5_DEPTH)


solid = Compound([f1.part, f4.part, f5.part])
